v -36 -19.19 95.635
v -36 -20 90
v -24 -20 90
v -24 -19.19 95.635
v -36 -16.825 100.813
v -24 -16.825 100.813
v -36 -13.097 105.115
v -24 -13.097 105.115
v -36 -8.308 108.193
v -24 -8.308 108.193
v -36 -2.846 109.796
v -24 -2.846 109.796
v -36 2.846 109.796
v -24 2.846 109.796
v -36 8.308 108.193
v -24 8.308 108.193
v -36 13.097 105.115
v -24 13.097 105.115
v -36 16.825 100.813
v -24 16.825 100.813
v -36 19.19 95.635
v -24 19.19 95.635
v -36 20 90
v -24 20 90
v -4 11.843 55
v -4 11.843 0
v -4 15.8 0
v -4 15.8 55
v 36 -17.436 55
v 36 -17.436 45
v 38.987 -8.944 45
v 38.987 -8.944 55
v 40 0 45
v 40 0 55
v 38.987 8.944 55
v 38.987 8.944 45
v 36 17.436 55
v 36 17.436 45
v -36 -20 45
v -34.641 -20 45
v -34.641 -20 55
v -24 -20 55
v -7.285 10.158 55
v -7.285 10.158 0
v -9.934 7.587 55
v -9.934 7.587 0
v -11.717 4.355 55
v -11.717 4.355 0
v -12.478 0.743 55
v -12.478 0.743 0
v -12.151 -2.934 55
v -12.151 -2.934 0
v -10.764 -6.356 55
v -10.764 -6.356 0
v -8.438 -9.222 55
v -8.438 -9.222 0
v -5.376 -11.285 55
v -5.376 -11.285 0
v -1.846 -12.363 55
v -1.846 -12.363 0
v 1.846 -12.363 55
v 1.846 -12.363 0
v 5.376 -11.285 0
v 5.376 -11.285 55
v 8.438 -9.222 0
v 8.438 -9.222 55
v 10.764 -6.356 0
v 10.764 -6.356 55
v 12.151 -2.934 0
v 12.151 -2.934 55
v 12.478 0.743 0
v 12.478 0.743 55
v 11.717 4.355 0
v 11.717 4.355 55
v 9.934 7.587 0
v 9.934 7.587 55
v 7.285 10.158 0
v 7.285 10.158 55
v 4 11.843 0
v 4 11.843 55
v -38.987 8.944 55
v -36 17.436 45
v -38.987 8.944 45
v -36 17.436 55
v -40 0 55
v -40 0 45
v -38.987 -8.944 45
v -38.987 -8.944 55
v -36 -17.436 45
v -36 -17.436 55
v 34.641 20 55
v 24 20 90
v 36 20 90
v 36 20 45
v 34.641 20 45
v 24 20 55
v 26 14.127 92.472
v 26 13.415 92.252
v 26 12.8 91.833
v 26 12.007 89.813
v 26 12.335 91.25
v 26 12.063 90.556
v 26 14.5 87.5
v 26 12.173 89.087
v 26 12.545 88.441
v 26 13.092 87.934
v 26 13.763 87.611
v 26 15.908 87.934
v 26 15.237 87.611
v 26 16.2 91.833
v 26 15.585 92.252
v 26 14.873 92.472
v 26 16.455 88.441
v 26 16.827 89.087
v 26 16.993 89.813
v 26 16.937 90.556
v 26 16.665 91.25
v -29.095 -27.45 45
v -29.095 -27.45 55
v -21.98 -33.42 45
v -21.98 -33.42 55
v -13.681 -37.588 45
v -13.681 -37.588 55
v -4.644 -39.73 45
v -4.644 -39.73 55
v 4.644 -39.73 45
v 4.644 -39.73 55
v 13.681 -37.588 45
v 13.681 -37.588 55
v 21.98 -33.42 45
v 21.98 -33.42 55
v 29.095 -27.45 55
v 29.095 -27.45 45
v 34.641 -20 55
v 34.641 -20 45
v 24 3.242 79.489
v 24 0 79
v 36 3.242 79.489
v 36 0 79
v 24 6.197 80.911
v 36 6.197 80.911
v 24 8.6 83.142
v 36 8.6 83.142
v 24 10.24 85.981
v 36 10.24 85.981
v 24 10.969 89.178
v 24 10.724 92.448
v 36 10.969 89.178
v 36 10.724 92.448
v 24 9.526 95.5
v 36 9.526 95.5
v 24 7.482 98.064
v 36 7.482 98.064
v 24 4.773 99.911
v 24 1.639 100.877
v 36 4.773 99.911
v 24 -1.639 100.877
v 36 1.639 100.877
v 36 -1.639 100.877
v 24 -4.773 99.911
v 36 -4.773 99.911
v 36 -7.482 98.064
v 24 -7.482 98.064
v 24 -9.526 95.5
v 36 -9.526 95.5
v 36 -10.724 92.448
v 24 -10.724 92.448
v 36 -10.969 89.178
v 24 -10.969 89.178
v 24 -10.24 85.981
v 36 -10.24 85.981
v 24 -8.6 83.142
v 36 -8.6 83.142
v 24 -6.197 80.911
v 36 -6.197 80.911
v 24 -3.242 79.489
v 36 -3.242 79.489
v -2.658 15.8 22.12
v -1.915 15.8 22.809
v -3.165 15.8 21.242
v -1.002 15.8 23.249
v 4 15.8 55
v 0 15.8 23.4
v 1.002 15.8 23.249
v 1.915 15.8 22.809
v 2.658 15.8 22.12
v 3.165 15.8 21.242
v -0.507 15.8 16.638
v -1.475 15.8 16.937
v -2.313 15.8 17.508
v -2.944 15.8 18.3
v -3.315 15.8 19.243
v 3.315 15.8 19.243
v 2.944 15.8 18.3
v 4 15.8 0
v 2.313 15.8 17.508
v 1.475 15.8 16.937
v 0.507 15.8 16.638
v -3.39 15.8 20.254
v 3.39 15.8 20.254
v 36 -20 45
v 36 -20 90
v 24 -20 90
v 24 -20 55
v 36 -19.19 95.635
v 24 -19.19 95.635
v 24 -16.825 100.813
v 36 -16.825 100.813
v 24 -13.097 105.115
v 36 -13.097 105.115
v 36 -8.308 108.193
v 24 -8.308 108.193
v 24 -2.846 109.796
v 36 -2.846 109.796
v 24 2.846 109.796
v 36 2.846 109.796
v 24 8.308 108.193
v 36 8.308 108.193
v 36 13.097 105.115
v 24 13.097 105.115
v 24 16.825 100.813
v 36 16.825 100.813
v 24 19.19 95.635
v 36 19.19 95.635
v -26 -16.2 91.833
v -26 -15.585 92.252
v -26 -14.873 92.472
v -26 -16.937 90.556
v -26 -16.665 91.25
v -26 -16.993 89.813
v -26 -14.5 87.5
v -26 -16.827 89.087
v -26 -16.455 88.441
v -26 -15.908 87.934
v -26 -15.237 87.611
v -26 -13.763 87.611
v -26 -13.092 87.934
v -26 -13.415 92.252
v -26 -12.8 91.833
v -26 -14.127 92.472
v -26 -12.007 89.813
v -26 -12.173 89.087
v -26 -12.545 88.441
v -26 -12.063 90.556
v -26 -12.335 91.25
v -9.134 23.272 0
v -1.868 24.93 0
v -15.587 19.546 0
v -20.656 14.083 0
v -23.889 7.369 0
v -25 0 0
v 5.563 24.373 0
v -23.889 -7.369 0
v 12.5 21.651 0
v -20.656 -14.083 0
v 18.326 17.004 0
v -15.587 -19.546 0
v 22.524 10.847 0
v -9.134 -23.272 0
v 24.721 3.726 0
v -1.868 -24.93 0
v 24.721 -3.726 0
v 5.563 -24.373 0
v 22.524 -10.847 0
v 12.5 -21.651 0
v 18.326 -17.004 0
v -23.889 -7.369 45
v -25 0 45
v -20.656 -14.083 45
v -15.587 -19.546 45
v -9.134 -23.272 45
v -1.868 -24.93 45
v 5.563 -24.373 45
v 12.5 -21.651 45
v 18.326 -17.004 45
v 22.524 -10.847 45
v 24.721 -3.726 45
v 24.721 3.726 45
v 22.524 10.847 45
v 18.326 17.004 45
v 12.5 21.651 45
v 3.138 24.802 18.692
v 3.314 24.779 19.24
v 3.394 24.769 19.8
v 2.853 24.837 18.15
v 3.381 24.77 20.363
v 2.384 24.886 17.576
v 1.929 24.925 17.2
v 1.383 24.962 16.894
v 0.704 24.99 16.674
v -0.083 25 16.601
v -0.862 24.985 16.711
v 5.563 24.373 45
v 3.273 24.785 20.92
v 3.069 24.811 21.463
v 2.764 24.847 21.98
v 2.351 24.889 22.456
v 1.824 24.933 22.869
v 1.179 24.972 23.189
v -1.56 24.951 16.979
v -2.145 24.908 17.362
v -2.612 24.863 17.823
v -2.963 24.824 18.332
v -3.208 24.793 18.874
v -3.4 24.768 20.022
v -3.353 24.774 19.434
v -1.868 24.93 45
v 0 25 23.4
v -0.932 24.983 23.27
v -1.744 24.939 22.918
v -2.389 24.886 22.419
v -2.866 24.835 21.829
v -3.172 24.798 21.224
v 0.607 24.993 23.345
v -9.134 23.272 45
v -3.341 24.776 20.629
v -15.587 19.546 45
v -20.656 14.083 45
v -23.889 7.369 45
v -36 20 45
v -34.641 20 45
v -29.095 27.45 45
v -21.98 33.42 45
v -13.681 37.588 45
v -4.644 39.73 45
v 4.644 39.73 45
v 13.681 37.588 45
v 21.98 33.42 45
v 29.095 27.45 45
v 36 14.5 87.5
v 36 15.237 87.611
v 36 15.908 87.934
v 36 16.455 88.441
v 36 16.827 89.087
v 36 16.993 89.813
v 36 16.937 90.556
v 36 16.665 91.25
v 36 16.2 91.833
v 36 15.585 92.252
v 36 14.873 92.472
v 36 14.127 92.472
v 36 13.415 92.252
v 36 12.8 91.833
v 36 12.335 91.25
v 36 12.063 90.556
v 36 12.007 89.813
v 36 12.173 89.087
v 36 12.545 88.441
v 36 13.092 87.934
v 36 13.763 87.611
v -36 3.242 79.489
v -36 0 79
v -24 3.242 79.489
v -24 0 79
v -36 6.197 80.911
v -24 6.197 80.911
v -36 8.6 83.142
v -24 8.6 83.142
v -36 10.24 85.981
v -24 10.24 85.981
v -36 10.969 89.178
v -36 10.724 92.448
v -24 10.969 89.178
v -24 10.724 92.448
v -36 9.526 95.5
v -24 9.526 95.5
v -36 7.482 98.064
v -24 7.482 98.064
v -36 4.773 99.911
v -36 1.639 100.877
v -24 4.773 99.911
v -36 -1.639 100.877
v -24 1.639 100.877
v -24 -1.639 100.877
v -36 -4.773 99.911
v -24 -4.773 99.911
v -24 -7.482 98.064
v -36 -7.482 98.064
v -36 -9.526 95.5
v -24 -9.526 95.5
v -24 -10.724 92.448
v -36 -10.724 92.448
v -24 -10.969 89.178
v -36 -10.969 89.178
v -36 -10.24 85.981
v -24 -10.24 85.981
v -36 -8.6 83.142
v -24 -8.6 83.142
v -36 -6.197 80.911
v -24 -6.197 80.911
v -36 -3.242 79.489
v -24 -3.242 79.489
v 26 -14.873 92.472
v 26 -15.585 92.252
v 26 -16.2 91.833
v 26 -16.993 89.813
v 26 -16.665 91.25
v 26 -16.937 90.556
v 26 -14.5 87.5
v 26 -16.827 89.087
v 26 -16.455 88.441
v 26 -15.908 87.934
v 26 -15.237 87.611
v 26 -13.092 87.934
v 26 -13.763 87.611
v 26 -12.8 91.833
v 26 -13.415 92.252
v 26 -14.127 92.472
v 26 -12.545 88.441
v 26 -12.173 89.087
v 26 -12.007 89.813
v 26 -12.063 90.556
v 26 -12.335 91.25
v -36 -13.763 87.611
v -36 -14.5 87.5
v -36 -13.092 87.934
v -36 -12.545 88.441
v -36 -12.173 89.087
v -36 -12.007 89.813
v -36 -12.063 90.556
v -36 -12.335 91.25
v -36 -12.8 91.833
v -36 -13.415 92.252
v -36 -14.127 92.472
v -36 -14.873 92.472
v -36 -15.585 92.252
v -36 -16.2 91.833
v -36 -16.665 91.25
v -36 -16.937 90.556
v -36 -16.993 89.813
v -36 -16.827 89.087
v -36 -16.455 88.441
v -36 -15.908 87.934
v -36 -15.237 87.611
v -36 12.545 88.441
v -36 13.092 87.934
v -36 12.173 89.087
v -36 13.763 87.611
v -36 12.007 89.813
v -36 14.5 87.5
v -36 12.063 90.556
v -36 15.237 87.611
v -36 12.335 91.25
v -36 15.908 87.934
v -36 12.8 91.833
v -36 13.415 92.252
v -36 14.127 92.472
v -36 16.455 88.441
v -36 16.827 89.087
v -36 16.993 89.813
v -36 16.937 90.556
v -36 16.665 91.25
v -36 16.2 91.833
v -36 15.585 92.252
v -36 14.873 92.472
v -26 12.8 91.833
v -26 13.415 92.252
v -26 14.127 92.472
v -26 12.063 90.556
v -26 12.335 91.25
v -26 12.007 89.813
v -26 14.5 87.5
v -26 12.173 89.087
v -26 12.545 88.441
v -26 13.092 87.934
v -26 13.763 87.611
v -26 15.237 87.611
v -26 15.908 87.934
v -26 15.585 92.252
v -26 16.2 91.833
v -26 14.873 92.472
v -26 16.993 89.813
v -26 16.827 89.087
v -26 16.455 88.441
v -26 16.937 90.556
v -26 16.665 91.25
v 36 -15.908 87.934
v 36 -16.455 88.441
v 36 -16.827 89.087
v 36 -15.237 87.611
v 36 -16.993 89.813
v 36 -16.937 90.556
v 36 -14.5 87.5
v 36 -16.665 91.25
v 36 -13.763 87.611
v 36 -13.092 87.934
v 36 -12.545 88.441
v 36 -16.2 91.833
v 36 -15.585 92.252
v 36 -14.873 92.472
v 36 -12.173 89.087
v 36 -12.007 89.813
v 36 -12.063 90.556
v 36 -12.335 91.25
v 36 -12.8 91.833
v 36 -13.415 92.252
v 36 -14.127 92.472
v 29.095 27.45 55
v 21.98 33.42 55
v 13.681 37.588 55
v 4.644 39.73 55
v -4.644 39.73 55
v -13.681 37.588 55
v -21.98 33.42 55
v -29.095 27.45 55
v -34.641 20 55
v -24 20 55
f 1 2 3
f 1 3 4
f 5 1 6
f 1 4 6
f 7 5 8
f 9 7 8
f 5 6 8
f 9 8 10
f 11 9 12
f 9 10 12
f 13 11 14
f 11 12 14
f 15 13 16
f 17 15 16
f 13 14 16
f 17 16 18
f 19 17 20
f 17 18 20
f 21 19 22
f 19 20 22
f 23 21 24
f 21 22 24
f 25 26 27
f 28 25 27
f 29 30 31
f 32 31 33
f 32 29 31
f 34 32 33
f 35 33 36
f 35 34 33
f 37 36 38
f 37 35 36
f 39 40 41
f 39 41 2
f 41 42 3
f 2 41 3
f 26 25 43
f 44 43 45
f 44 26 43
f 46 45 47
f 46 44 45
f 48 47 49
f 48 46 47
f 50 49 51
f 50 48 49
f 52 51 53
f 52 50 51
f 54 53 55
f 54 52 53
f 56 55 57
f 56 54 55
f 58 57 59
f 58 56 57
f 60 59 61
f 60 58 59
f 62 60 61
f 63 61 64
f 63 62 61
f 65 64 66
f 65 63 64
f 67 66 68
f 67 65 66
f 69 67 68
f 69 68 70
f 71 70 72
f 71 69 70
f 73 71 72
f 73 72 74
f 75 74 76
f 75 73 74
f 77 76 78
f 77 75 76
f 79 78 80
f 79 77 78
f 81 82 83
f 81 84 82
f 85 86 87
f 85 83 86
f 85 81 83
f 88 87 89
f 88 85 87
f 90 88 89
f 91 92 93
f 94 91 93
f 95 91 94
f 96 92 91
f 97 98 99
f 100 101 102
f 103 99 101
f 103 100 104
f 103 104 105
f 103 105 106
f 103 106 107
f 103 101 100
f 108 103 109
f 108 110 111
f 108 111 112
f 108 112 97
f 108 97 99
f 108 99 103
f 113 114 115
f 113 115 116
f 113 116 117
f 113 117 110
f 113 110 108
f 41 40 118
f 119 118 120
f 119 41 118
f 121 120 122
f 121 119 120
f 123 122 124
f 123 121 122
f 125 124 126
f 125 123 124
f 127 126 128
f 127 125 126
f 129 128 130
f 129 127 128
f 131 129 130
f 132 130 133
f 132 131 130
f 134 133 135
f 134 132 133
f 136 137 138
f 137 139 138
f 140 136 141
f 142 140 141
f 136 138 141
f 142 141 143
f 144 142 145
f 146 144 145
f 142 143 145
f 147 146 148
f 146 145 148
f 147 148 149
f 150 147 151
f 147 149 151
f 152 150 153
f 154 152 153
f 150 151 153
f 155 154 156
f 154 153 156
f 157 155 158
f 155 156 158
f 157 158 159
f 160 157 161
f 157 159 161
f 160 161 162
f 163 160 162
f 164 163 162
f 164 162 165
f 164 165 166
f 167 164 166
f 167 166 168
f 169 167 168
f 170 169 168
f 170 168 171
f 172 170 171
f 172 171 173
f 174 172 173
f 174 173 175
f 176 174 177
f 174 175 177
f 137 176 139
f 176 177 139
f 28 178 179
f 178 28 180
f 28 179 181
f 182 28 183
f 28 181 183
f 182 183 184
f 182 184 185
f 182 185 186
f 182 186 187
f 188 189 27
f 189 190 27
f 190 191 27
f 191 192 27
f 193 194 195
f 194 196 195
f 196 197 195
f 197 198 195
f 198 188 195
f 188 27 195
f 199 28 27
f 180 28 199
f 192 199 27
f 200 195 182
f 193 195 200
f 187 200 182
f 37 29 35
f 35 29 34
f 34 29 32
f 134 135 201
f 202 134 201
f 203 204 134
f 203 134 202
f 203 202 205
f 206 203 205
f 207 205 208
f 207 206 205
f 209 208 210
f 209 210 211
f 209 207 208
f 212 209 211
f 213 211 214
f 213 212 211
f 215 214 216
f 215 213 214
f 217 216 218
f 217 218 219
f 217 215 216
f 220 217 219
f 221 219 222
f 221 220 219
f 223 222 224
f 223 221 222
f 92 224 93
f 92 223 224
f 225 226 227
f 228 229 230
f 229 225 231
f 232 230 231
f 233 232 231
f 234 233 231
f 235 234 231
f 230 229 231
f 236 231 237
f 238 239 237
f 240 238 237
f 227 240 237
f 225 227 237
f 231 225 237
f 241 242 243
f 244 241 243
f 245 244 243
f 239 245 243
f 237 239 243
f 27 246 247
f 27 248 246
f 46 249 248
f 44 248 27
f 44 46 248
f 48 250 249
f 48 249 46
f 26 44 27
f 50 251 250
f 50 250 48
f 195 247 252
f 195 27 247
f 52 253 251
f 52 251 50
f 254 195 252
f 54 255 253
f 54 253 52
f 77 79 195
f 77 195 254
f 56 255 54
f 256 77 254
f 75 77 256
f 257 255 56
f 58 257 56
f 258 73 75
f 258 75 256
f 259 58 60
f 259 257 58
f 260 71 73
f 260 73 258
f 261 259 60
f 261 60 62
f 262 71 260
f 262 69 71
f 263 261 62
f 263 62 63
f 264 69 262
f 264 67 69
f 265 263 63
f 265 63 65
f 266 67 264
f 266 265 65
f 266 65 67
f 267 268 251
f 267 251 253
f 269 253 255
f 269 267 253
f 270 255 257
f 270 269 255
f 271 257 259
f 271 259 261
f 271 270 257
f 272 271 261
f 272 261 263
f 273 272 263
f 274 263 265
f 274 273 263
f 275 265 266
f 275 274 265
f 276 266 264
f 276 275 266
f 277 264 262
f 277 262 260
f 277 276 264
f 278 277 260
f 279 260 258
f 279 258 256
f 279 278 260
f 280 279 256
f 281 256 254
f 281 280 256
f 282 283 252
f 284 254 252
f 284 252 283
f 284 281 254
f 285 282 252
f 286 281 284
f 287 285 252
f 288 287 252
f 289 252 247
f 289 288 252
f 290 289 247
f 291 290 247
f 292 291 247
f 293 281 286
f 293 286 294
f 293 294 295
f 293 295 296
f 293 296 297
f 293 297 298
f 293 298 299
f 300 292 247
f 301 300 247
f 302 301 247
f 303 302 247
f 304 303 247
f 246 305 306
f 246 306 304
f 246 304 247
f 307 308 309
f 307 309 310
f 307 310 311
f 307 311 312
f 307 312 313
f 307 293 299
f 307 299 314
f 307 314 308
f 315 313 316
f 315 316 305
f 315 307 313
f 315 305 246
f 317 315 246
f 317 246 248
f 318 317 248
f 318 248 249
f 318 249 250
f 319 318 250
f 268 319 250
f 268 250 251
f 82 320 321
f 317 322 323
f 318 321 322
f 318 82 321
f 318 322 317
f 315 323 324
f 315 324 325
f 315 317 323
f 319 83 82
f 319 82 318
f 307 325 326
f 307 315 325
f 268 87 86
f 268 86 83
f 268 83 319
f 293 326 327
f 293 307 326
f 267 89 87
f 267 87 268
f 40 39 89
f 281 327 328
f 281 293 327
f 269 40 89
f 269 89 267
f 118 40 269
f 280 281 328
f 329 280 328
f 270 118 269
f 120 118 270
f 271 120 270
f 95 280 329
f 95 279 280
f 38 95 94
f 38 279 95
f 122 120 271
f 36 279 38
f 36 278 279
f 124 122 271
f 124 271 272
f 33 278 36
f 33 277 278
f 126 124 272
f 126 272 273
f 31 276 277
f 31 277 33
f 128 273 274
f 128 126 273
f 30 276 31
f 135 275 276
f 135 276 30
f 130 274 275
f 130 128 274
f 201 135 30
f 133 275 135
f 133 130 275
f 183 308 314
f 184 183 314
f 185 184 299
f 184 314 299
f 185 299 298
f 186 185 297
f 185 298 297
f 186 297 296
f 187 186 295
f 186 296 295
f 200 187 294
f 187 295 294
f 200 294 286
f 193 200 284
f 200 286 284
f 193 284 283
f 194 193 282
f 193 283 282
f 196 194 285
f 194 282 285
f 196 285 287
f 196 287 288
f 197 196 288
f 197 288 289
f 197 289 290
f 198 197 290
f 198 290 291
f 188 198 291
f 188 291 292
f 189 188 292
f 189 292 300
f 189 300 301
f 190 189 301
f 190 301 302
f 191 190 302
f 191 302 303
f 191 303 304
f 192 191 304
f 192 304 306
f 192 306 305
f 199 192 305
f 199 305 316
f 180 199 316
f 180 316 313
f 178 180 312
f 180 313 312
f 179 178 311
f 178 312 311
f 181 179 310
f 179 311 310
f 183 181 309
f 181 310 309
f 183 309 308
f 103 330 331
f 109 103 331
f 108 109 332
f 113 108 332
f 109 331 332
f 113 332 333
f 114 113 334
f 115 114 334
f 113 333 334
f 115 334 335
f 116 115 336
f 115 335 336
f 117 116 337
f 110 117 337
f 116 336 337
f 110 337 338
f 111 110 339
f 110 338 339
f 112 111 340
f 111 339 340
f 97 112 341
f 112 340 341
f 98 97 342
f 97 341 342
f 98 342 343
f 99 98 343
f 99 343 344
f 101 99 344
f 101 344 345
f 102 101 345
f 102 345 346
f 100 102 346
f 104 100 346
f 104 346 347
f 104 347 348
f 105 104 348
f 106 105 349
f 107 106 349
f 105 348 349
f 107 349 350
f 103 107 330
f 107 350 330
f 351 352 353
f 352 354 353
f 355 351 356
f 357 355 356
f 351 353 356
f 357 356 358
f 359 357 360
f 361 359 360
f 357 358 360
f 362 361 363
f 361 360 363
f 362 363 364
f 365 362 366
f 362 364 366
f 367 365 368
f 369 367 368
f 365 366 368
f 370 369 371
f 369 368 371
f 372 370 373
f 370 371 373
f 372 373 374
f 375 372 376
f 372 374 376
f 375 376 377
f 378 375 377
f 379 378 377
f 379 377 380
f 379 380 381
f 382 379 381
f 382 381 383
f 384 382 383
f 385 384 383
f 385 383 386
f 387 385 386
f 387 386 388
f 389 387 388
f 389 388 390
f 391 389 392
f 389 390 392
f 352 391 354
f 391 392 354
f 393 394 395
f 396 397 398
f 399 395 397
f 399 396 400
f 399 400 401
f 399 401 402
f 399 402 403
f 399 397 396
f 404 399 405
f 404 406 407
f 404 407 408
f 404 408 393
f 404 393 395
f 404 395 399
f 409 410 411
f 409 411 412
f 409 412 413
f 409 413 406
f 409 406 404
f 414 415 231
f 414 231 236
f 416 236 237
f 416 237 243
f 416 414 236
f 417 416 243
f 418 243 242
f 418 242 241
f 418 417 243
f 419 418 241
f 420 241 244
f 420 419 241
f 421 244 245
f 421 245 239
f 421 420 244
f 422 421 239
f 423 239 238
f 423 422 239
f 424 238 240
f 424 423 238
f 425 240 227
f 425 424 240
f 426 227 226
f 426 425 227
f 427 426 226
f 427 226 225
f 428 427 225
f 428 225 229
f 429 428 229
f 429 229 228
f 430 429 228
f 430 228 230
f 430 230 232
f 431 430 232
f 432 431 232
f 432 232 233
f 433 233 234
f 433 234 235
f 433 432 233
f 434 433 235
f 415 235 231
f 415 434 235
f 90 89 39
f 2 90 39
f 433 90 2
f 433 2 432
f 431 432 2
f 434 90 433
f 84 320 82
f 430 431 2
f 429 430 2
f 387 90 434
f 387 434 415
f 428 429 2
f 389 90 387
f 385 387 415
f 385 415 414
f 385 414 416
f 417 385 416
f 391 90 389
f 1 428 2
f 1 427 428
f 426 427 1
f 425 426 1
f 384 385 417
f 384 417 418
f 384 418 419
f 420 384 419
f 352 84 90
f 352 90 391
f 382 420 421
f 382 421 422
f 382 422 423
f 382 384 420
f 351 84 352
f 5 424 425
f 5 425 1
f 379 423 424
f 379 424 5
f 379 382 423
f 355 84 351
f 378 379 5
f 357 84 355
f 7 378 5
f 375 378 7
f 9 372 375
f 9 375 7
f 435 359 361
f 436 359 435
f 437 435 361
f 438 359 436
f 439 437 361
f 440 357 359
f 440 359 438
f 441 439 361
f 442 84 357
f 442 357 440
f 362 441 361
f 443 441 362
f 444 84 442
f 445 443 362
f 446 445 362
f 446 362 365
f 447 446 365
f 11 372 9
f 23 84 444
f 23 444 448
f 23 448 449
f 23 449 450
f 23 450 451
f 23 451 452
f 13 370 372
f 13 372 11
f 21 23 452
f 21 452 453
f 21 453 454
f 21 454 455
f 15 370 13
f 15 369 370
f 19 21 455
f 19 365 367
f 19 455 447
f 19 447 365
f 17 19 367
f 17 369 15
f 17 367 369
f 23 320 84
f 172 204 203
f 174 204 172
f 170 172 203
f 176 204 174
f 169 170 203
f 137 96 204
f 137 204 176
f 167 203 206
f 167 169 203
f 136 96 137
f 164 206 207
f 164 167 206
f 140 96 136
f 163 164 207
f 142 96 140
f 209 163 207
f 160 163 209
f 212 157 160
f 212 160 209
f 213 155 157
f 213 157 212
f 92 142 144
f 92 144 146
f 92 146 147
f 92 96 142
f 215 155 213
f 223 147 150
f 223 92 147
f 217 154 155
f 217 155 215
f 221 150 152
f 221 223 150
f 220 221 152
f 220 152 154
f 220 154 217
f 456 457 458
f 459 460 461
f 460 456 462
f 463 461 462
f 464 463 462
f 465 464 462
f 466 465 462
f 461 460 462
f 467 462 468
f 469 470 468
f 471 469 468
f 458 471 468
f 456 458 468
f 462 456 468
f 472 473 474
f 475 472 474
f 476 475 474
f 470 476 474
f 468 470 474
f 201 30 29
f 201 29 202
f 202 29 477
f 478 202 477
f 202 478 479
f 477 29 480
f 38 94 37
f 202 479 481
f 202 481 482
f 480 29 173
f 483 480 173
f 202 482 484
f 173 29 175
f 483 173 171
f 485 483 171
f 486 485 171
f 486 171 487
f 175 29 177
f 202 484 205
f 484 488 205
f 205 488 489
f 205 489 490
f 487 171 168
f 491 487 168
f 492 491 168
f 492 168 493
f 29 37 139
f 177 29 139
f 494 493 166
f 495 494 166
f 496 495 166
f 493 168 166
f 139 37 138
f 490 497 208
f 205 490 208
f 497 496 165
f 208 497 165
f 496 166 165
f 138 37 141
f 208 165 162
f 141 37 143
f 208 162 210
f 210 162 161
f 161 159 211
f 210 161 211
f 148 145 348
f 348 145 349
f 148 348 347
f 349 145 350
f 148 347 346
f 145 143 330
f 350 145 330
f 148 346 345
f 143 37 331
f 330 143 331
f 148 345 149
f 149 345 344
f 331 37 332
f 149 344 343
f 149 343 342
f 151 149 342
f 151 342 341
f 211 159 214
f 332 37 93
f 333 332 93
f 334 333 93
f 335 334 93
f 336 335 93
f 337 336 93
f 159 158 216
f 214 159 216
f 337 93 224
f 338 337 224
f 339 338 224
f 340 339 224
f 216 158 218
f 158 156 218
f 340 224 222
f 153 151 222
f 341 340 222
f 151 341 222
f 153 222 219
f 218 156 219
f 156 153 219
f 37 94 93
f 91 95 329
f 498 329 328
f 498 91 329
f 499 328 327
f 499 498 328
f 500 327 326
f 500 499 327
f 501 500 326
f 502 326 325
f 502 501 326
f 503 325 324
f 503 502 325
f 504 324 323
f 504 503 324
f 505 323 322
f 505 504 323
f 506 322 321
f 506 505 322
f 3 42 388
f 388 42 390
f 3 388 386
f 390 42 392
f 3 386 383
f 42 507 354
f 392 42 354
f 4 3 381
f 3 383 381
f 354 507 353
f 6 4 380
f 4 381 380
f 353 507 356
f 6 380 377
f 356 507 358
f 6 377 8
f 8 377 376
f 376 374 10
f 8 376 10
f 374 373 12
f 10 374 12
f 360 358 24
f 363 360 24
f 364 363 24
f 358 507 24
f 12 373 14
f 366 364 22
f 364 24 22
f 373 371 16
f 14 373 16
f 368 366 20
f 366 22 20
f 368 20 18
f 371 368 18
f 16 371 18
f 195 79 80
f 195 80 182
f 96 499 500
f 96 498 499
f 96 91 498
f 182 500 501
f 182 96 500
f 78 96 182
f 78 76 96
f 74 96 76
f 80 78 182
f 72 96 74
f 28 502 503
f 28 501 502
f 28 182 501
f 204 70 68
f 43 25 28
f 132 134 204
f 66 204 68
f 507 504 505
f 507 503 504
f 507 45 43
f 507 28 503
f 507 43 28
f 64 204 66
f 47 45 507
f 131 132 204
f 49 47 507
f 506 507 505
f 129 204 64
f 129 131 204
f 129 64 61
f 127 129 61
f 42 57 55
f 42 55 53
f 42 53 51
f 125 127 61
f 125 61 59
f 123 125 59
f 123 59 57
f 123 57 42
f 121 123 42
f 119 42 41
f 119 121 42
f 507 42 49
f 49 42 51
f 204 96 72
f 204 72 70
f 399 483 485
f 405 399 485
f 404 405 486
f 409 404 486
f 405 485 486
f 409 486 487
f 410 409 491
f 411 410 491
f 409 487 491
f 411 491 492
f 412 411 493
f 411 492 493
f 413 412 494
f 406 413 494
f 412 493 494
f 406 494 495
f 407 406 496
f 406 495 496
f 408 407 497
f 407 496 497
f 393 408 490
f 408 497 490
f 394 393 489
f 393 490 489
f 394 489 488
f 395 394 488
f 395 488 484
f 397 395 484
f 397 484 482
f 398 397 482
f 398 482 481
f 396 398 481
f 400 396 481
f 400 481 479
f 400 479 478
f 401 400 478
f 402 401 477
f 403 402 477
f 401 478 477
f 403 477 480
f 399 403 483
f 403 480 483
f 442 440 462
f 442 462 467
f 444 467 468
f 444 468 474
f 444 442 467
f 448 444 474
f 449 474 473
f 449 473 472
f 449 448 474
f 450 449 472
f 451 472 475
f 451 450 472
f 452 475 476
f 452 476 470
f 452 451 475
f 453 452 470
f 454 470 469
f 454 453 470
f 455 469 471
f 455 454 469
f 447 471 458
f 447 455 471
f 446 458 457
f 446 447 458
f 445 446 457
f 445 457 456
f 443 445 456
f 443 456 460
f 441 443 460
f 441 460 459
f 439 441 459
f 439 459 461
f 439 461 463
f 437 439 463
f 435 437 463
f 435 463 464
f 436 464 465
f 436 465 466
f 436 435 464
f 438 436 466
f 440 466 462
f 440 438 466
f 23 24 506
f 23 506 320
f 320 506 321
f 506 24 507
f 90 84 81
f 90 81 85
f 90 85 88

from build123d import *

# Parameters (mm, degrees)
EXTRUDE_1_DEPTH     = 12
SKETCH_3_R          = 11
CUT_EXTRUDE_1_DEPTH = 111
SKETCH_4_R          = 12.5
CUT_EXTRUDE_2_DEPTH = 124.693168769
SKETCH_5_W          = 8
SKETCH_5_H          = 15.8
CUT_EXTRUDE_3_DEPTH = 124.693168769
SKETCH_6_R          = 3.4
CUT_EXTRUDE_4_DEPTH = 13
SKETCH_7_R          = 2.5
CUT_EXTRUDE_5_DEPTH = 10


with BuildPart() as part:
    # 草图1 → 旋转1 (revolve)
    with BuildSketch(Plane(origin=(0, 0, 0), x_dir=(1, 0, 0), z_dir=(0, 1, 0)), mode=Mode.PRIVATE) as revolve_1_sk:
        Polygon((0, 0), (25, 0), (25, -45), (40, -45), (40, -55), (0, -55), align=None)
    revolve(revolve_1_sk.sketch.rotate(Axis((0, 0, 0), (0, 0, 1)), 180), axis=Axis((0, 0, 0), (0, 0, 1)))

    # 草图2 → 凸台-拉伸1 (add)
    with BuildSketch(Plane(origin=(24, 0, 0), x_dir=(0, 0, -1), z_dir=(1, 0, 0))):
        with BuildLine():
            Line((-45, -20), (-90, -20))
            ThreePointArc((-90, -20), (-110, 0), (-90, 20))
            Line((-90, 20), (-45, 20))
            Line((-45, 20), (-45, -20))
        make_face()
    extrude_1 = extrude(amount=EXTRUDE_1_DEPTH)

    # 镜向1: 凸台-拉伸1 across plane
    add(extrude_1.mirror(Plane(origin=(0, 0, 0), x_dir=(0, 0, 1), z_dir=(1, 0, 0))))

    # 草图3 → 切除-拉伸1 (cut, symmetric)
    with BuildSketch(Plane(origin=(0, 0, 0), x_dir=(0, 0, -1), z_dir=(1, 0, 0))):
        with Locations((-90, 0)):
            Circle(SKETCH_3_R)
    extrude(amount=CUT_EXTRUDE_1_DEPTH, both=True, mode=Mode.SUBTRACT)

    # 草图4 → 切除-拉伸2 (cut, through all)
    with BuildSketch(Plane.XY):
        with Locations(Location((0, 0, 0), (0, 0, 180))):
            Circle(SKETCH_4_R)
    extrude(amount=CUT_EXTRUDE_2_DEPTH, mode=Mode.SUBTRACT)

    # 草图5 → 切除-拉伸3 (cut, through all)
    with BuildSketch(Plane.XY):
        with Locations((0, 7.9)):
            Rectangle(SKETCH_5_W, SKETCH_5_H)
    extrude(amount=CUT_EXTRUDE_3_DEPTH, mode=Mode.SUBTRACT)

    # 草图6 → 切除-拉伸4 (cut)
    with BuildSketch(Plane(origin=(0, 25, 0), x_dir=(1, 0, 0), z_dir=(0, 1, 0))):
        with Locations(Location((0, -20, 0), (0, 0, 270))):
            Circle(SKETCH_6_R)
    extrude(amount=-CUT_EXTRUDE_4_DEPTH, mode=Mode.SUBTRACT)

    # 草图7 → 切除-拉伸5 (cut)
    with BuildSketch(Plane(origin=(36, 0, 0), x_dir=(0, 0, -1), z_dir=(1, 0, 0))):
        with Locations((-90, 14.5)):
            Circle(SKETCH_7_R)
        with Locations((-90, -14.5)):
            Circle(SKETCH_7_R)
    cut_extrude_5 = extrude(amount=-CUT_EXTRUDE_5_DEPTH, mode=Mode.SUBTRACT)

    # 镜向2: 切除-拉伸5 across plane
    add(cut_extrude_5.mirror(Plane(origin=(0, 0, 0), x_dir=(0, 0, 1), z_dir=(1, 0, 0))), mode=Mode.SUBTRACT)


solid = part.part
